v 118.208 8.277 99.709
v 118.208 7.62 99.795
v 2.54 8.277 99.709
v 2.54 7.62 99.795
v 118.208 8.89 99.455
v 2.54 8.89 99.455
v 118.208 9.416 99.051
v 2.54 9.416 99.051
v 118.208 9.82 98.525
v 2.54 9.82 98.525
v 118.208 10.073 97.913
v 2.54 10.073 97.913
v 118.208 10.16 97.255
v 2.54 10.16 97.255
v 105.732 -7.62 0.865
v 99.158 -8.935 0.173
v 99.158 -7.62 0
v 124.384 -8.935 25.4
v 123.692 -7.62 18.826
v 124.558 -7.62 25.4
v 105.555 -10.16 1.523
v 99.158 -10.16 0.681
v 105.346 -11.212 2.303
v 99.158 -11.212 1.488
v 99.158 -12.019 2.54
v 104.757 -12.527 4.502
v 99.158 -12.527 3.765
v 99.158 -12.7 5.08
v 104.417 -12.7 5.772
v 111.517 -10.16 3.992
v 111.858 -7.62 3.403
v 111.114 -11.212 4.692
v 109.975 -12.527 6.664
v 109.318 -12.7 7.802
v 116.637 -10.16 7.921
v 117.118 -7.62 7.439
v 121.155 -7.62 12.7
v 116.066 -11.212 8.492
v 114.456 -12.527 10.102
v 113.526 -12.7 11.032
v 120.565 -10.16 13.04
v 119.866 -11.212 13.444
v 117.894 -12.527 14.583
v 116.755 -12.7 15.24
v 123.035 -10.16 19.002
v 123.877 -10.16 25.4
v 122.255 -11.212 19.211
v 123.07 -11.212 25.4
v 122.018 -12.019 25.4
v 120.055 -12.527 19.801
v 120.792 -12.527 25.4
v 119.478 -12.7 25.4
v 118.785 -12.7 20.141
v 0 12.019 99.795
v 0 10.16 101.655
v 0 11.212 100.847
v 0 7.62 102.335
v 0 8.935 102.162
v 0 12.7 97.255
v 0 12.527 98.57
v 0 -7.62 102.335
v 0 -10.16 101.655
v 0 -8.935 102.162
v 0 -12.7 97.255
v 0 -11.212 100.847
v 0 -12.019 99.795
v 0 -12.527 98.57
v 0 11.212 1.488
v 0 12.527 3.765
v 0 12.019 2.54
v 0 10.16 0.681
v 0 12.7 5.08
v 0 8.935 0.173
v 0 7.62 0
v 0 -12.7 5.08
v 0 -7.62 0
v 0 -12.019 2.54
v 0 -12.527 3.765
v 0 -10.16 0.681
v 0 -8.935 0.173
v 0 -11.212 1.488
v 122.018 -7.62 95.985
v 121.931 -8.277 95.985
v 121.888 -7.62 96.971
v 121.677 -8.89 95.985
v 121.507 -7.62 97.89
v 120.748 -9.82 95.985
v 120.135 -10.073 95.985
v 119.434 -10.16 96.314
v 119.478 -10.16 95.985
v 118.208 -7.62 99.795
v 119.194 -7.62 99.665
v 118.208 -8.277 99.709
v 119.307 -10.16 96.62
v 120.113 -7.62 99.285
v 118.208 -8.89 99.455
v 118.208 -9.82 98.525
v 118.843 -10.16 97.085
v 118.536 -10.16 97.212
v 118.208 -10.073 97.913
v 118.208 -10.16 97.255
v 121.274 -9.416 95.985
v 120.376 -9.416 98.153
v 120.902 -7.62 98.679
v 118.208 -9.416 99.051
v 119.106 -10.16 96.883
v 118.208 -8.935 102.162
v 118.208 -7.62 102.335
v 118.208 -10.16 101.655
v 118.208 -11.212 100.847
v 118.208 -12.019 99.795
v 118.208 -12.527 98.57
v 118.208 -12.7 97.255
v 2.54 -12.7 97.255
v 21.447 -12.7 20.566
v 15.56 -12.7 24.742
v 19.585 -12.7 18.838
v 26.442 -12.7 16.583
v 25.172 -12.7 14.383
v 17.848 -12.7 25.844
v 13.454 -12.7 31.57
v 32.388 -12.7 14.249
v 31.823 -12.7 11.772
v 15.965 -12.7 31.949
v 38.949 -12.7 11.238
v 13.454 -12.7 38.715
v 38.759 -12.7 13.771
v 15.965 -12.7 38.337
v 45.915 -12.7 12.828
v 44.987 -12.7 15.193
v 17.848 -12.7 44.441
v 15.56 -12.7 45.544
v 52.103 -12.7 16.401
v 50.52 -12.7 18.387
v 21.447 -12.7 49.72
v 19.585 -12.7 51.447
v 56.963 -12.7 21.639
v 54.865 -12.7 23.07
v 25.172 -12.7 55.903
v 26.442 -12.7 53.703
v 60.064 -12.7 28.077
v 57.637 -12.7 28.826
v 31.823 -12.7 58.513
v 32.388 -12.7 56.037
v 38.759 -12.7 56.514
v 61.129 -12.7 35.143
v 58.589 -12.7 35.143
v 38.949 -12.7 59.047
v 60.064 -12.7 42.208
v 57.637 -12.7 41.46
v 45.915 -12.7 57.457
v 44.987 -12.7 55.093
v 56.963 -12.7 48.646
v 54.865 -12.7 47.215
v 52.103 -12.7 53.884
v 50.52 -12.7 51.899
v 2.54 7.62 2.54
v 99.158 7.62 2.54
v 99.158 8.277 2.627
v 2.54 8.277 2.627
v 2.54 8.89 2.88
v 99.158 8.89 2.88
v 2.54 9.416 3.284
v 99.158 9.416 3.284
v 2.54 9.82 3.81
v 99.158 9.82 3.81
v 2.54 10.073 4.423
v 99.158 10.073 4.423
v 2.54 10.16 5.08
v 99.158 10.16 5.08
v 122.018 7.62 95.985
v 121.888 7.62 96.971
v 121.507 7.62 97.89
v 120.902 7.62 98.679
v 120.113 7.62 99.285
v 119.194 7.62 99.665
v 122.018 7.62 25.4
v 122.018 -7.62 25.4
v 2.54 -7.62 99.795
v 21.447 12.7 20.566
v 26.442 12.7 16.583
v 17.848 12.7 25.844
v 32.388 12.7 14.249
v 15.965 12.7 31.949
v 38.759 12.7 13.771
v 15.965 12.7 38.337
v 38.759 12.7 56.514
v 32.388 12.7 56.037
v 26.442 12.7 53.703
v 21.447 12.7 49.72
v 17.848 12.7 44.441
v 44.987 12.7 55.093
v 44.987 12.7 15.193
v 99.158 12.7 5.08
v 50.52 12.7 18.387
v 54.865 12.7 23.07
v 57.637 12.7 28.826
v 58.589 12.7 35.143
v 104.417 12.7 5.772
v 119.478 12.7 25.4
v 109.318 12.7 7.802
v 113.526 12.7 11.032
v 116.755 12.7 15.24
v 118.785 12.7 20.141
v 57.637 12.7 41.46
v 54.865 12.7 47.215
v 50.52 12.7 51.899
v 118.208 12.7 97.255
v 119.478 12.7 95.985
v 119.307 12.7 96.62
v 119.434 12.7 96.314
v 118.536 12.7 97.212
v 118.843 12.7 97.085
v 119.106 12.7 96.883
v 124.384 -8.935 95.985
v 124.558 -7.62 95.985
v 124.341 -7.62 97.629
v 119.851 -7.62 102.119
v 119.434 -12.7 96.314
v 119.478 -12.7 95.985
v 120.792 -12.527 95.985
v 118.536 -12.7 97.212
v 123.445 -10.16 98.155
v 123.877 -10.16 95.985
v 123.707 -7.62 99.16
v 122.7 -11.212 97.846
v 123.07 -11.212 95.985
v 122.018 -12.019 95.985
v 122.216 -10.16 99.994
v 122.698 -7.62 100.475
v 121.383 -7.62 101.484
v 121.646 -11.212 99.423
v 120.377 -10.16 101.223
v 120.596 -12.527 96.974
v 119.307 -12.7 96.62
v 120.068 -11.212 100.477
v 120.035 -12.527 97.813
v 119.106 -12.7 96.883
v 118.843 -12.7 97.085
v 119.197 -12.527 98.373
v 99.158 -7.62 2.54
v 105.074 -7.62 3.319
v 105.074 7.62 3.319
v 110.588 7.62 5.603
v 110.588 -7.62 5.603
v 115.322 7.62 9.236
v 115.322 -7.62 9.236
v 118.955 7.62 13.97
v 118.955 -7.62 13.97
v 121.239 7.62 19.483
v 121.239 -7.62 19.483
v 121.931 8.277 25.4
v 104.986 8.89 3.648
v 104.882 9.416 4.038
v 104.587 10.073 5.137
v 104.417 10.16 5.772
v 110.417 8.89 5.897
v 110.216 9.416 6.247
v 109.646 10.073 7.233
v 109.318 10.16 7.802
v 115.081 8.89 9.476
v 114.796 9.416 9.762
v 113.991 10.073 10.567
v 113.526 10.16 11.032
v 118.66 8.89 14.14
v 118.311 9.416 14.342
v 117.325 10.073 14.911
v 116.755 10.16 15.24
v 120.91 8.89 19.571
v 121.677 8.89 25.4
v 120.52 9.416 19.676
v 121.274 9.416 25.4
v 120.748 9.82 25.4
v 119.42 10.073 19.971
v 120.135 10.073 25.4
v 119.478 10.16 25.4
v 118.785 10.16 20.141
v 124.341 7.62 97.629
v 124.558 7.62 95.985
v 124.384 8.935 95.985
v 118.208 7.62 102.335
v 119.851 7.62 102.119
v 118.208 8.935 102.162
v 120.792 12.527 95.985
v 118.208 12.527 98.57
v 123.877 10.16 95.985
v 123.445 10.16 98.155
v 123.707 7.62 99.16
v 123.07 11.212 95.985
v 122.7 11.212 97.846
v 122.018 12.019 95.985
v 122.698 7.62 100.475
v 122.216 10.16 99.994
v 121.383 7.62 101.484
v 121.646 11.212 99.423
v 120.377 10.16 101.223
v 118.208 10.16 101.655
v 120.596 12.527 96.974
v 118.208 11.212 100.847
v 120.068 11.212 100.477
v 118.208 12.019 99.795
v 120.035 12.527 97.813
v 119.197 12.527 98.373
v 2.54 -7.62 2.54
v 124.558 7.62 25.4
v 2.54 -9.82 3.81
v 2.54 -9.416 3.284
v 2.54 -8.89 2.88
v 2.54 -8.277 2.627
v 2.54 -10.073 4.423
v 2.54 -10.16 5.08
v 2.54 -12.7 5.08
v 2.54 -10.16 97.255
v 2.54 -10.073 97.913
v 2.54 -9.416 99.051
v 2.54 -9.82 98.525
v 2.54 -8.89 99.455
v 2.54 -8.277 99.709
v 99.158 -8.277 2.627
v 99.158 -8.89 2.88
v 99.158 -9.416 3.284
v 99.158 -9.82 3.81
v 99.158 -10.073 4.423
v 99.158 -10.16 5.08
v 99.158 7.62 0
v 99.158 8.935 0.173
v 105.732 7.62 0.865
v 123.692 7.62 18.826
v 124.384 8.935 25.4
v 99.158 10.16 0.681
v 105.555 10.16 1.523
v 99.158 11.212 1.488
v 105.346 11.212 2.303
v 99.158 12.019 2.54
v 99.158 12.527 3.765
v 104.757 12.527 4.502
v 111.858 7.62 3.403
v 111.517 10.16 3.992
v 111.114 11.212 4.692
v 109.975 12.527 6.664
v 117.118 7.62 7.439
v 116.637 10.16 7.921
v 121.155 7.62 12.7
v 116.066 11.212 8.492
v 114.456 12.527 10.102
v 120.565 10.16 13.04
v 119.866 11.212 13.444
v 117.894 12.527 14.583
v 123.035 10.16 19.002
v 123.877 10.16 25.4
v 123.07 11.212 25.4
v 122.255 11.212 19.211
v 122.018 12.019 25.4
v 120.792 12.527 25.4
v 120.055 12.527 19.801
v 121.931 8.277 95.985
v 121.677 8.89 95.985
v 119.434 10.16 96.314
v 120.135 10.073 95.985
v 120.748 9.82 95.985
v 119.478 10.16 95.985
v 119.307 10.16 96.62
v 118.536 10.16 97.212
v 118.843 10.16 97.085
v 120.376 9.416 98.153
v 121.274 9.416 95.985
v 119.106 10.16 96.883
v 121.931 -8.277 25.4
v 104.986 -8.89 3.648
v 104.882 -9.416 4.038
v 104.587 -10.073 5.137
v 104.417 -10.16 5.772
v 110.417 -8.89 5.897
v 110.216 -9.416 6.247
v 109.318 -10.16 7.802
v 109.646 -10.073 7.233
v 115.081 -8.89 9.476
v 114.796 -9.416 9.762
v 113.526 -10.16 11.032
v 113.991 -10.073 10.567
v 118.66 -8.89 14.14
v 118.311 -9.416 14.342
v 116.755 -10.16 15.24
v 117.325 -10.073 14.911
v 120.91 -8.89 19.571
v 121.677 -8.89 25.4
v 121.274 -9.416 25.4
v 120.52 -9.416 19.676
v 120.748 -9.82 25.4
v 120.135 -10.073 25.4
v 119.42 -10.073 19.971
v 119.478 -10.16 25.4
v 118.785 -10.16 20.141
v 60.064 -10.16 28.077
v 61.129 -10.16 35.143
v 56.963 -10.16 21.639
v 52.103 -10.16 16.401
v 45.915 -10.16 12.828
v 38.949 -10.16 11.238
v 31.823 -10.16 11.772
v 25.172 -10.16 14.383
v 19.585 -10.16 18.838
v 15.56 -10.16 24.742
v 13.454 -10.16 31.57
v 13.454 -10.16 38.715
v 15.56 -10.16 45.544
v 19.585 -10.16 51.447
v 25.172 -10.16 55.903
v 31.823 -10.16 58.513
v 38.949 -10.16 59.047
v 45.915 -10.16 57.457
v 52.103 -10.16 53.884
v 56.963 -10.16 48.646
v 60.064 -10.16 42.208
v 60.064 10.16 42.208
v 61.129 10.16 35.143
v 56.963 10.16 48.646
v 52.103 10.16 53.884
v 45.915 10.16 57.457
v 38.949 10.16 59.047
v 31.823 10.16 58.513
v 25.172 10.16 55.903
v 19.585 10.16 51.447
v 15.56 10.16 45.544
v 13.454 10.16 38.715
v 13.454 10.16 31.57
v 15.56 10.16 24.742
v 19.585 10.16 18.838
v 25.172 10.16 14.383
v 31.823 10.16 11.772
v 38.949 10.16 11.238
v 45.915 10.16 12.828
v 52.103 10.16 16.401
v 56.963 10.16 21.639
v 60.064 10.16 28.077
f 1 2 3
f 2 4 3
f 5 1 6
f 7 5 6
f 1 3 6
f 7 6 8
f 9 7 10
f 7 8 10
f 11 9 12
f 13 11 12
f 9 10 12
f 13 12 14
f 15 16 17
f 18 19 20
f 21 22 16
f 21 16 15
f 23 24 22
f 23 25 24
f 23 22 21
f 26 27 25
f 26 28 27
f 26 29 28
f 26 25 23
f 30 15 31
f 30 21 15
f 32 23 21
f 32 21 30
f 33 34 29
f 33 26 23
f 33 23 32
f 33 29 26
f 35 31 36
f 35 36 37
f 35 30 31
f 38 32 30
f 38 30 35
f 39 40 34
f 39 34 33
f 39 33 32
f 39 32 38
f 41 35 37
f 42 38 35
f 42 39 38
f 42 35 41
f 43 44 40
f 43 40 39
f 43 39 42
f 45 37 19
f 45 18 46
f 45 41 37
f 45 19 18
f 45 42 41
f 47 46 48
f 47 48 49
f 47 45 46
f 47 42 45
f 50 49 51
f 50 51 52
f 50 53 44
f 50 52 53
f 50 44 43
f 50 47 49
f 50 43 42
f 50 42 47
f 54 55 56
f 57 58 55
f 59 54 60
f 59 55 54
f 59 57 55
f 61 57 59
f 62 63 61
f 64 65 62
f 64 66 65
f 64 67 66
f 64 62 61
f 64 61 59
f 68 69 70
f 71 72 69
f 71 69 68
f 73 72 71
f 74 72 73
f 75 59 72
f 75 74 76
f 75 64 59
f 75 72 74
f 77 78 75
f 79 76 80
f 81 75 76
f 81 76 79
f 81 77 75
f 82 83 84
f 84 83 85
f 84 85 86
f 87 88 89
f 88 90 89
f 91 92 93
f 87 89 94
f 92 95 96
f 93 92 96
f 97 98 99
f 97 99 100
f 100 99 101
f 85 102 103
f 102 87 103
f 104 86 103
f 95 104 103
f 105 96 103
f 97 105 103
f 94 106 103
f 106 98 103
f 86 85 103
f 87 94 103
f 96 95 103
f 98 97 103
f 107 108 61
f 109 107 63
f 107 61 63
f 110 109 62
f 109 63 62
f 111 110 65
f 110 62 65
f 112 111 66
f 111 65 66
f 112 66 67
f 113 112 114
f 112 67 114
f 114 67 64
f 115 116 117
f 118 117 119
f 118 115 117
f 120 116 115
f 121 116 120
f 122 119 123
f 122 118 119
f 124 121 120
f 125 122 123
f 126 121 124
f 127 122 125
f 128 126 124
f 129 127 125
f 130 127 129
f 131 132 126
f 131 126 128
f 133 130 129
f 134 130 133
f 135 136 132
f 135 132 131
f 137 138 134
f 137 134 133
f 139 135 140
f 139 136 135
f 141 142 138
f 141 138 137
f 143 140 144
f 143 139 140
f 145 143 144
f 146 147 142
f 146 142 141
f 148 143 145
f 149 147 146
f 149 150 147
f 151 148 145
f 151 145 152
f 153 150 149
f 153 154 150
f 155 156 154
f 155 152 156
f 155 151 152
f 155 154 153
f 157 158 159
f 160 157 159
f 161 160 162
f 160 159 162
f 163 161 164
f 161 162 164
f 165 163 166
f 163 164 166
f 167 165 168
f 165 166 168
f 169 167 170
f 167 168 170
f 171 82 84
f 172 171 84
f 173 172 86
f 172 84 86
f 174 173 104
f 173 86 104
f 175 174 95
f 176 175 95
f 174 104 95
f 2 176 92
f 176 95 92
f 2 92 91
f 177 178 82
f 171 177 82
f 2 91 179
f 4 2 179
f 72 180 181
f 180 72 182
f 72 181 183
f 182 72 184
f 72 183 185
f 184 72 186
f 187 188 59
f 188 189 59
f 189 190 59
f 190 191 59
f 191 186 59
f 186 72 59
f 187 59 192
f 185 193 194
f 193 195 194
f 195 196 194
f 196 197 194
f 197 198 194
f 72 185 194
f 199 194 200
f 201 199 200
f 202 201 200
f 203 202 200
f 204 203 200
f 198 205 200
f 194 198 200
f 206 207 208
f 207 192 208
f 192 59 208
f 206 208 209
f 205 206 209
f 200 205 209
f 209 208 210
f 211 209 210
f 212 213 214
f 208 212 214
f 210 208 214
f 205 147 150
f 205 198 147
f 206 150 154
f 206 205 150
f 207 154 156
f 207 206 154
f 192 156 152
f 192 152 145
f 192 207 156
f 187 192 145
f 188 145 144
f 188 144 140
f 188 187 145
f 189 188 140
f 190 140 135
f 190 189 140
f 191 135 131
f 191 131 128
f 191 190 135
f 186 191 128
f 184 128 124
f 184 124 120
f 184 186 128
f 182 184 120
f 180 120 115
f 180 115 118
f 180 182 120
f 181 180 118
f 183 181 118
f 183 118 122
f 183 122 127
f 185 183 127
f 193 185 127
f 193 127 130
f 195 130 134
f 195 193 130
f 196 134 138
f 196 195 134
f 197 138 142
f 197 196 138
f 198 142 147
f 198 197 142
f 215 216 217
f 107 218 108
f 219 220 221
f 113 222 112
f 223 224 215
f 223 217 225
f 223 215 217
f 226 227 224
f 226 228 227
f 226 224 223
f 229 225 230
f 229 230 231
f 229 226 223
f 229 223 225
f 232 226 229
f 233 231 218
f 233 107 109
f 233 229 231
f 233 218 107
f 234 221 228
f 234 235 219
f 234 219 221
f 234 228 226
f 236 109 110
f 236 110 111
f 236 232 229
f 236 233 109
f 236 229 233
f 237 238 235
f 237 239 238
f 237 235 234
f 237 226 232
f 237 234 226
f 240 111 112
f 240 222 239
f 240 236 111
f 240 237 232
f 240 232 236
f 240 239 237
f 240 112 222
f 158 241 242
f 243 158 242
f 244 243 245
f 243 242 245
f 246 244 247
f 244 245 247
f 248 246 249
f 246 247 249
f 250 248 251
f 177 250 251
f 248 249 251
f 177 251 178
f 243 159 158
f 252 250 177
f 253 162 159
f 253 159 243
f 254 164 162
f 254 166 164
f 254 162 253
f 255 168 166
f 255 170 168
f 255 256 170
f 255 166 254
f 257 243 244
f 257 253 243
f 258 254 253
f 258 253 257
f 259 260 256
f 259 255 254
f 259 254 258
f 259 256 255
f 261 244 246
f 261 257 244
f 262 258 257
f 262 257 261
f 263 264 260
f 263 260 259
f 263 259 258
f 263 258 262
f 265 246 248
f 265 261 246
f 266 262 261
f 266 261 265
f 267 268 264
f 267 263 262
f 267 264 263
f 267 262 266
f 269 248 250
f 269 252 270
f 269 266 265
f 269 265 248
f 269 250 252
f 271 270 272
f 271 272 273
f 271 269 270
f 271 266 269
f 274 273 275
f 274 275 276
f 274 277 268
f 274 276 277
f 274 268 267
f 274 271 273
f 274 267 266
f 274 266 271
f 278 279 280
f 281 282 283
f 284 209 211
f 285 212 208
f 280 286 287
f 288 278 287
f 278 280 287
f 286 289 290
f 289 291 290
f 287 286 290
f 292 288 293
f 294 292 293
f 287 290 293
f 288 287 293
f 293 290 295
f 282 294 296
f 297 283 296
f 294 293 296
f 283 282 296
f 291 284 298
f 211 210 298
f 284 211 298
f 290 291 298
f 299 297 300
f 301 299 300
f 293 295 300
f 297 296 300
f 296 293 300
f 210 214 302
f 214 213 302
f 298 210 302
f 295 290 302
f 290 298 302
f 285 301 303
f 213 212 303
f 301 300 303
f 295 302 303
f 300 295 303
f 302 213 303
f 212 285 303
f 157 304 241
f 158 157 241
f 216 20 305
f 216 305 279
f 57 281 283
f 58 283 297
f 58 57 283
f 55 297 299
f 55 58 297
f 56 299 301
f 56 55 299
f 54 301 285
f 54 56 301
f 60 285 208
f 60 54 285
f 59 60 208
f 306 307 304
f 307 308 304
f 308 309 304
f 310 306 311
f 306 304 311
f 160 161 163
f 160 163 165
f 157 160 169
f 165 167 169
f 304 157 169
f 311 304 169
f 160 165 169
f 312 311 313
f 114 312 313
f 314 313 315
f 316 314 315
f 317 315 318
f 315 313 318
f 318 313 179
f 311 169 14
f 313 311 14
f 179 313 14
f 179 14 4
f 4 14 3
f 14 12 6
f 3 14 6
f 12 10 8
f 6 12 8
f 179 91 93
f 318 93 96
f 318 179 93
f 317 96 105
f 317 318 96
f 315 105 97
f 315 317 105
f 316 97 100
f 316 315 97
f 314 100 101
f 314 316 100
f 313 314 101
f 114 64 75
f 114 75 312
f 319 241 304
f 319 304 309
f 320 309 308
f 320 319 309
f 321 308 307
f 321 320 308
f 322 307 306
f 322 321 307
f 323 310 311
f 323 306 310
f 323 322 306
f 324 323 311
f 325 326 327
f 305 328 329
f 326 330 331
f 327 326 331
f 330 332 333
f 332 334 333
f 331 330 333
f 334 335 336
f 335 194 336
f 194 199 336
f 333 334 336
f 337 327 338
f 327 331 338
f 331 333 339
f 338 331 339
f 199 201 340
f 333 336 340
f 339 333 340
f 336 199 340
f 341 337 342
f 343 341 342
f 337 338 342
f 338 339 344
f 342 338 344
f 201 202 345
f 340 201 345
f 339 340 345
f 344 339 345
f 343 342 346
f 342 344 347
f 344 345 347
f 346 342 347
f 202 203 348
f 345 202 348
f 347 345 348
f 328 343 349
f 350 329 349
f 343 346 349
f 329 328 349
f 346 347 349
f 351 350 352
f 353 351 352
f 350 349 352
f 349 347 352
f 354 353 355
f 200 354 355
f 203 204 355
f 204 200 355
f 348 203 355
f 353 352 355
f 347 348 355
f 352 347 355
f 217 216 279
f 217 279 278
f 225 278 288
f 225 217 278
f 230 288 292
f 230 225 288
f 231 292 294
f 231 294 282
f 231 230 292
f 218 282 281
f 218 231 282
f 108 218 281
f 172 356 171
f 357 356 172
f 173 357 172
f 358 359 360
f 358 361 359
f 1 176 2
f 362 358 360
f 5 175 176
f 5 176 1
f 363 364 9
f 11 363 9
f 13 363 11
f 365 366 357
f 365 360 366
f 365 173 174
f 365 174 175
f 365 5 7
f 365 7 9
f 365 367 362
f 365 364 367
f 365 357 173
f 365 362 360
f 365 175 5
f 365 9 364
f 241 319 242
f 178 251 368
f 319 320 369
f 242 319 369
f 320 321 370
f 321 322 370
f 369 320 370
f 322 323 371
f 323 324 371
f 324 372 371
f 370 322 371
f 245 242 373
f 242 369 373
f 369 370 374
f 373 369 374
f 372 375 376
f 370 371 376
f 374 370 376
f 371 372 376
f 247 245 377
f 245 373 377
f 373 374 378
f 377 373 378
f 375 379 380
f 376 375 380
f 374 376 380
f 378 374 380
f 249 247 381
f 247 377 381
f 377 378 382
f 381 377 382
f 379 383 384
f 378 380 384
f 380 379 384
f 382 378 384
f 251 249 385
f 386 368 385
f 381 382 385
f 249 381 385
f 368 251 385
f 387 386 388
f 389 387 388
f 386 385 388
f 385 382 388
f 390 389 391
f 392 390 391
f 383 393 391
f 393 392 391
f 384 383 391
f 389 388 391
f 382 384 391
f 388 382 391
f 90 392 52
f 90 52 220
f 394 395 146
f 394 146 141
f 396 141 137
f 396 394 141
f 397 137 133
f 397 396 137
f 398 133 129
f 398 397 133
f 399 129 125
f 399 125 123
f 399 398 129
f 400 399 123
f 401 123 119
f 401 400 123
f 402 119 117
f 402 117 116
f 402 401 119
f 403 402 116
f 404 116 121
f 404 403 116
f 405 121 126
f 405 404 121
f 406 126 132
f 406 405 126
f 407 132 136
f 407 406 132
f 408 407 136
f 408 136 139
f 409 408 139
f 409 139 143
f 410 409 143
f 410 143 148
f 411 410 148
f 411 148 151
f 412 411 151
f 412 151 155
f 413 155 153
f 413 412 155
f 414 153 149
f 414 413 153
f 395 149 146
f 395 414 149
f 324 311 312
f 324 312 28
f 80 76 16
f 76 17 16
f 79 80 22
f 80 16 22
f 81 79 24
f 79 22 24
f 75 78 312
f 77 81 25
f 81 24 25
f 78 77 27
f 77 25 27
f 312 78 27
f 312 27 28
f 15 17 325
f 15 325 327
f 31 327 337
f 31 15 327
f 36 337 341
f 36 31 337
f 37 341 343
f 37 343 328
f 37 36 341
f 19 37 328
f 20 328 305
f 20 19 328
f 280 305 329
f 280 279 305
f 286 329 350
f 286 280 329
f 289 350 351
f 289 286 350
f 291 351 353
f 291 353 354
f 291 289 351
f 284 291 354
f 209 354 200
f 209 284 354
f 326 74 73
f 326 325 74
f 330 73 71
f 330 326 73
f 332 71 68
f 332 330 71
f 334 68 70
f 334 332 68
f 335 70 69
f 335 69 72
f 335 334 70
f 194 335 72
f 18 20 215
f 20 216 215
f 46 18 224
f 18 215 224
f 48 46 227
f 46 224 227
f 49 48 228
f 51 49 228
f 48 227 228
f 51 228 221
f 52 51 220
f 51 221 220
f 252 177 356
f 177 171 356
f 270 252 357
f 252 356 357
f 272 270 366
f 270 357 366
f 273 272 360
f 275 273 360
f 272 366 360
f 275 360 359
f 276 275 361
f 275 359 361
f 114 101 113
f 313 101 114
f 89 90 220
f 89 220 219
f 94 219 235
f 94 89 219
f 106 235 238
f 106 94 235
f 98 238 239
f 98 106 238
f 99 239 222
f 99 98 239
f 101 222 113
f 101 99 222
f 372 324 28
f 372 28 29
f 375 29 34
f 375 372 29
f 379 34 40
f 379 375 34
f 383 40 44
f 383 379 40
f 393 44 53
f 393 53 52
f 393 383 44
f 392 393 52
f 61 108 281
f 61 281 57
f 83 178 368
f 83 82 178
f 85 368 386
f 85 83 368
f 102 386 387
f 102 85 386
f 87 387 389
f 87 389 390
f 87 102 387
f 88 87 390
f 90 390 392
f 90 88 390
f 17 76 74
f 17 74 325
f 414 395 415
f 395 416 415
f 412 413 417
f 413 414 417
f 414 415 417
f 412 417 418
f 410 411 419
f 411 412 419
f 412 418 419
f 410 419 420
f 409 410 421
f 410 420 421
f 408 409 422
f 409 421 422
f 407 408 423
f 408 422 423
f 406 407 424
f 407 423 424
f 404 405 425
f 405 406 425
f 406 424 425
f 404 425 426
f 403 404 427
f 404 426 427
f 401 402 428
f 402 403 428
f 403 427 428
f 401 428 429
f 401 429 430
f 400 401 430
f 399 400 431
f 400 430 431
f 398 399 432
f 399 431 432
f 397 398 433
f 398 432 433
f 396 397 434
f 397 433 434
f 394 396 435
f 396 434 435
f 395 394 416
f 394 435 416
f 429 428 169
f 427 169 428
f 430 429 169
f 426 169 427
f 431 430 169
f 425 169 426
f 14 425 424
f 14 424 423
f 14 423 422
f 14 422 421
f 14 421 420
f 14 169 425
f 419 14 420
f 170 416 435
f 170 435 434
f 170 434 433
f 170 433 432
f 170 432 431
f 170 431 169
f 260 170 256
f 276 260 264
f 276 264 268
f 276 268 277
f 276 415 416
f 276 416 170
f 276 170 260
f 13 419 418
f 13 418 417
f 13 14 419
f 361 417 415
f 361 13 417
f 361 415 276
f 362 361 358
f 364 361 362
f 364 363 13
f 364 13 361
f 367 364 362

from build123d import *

# Parameters (mm, degrees)
F0_R     = 21.4314801072
F1_DEPTH = 12.7
F2_R     = 5.08
F3_T     = -2.54


# Not quite as in the source:
# - a shell that OpenCascade refuses in one call is made with other operations: the cavity is built on its own and cut out


with BuildPart() as f1:
    # F0 (on Front) → F1 (new body, symmetric)
    with BuildSketch(Plane.XZ):
        with BuildLine():
            Line((0, 102.3351529121), (0, 0))
            Line((0, 0), (99.1575824261, 0))
            ThreePointArc((99.1575824261, 0), (117.1180946682, 7.4394877579), (124.5575824261, 25.4))
            Line((124.5575824261, 25.4), (124.5575824261, 95.9851529121))
            ThreePointArc((124.5575824261, 95.9851529121), (122.6977104866, 100.4752809727), (118.2075824261, 102.3351529121))
            Line((118.2075824261, 102.3351529121), (0, 102.3351529121))
        make_face()
        with Locations((37.157318583, 35.142709024)):
            Circle(F0_R, mode=Mode.SUBTRACT)
    extrude(amount=F1_DEPTH, both=True)

    # F2
    f2_edges = [f1.edges().sort_by_distance(p)[0] for p in [
        (59.103791, 12.7, 102.335153),
        (59.103791, -12.7, 102.335153),
    ]]
    fillet(f2_edges, radius=F2_R)

    # F3: a shell. OpenCascade refuses it in one call, so the cavity is built on its own and cut out:
    # the body offset inwards by the wall thickness, plus a prism from it out through each open face.
    f3_core = offset(f1.part, amount=F3_T, mode=Mode.PRIVATE)
    f3_exits = [f3_core.faces().sort_by_distance(p)[0] for p in [
        (65.31507, -10.16, 54.836293),
    ]]
    add(f3_core, mode=Mode.SUBTRACT)
    extrude(f3_exits, amount=-F3_T, mode=Mode.SUBTRACT)


solid = f1.part
